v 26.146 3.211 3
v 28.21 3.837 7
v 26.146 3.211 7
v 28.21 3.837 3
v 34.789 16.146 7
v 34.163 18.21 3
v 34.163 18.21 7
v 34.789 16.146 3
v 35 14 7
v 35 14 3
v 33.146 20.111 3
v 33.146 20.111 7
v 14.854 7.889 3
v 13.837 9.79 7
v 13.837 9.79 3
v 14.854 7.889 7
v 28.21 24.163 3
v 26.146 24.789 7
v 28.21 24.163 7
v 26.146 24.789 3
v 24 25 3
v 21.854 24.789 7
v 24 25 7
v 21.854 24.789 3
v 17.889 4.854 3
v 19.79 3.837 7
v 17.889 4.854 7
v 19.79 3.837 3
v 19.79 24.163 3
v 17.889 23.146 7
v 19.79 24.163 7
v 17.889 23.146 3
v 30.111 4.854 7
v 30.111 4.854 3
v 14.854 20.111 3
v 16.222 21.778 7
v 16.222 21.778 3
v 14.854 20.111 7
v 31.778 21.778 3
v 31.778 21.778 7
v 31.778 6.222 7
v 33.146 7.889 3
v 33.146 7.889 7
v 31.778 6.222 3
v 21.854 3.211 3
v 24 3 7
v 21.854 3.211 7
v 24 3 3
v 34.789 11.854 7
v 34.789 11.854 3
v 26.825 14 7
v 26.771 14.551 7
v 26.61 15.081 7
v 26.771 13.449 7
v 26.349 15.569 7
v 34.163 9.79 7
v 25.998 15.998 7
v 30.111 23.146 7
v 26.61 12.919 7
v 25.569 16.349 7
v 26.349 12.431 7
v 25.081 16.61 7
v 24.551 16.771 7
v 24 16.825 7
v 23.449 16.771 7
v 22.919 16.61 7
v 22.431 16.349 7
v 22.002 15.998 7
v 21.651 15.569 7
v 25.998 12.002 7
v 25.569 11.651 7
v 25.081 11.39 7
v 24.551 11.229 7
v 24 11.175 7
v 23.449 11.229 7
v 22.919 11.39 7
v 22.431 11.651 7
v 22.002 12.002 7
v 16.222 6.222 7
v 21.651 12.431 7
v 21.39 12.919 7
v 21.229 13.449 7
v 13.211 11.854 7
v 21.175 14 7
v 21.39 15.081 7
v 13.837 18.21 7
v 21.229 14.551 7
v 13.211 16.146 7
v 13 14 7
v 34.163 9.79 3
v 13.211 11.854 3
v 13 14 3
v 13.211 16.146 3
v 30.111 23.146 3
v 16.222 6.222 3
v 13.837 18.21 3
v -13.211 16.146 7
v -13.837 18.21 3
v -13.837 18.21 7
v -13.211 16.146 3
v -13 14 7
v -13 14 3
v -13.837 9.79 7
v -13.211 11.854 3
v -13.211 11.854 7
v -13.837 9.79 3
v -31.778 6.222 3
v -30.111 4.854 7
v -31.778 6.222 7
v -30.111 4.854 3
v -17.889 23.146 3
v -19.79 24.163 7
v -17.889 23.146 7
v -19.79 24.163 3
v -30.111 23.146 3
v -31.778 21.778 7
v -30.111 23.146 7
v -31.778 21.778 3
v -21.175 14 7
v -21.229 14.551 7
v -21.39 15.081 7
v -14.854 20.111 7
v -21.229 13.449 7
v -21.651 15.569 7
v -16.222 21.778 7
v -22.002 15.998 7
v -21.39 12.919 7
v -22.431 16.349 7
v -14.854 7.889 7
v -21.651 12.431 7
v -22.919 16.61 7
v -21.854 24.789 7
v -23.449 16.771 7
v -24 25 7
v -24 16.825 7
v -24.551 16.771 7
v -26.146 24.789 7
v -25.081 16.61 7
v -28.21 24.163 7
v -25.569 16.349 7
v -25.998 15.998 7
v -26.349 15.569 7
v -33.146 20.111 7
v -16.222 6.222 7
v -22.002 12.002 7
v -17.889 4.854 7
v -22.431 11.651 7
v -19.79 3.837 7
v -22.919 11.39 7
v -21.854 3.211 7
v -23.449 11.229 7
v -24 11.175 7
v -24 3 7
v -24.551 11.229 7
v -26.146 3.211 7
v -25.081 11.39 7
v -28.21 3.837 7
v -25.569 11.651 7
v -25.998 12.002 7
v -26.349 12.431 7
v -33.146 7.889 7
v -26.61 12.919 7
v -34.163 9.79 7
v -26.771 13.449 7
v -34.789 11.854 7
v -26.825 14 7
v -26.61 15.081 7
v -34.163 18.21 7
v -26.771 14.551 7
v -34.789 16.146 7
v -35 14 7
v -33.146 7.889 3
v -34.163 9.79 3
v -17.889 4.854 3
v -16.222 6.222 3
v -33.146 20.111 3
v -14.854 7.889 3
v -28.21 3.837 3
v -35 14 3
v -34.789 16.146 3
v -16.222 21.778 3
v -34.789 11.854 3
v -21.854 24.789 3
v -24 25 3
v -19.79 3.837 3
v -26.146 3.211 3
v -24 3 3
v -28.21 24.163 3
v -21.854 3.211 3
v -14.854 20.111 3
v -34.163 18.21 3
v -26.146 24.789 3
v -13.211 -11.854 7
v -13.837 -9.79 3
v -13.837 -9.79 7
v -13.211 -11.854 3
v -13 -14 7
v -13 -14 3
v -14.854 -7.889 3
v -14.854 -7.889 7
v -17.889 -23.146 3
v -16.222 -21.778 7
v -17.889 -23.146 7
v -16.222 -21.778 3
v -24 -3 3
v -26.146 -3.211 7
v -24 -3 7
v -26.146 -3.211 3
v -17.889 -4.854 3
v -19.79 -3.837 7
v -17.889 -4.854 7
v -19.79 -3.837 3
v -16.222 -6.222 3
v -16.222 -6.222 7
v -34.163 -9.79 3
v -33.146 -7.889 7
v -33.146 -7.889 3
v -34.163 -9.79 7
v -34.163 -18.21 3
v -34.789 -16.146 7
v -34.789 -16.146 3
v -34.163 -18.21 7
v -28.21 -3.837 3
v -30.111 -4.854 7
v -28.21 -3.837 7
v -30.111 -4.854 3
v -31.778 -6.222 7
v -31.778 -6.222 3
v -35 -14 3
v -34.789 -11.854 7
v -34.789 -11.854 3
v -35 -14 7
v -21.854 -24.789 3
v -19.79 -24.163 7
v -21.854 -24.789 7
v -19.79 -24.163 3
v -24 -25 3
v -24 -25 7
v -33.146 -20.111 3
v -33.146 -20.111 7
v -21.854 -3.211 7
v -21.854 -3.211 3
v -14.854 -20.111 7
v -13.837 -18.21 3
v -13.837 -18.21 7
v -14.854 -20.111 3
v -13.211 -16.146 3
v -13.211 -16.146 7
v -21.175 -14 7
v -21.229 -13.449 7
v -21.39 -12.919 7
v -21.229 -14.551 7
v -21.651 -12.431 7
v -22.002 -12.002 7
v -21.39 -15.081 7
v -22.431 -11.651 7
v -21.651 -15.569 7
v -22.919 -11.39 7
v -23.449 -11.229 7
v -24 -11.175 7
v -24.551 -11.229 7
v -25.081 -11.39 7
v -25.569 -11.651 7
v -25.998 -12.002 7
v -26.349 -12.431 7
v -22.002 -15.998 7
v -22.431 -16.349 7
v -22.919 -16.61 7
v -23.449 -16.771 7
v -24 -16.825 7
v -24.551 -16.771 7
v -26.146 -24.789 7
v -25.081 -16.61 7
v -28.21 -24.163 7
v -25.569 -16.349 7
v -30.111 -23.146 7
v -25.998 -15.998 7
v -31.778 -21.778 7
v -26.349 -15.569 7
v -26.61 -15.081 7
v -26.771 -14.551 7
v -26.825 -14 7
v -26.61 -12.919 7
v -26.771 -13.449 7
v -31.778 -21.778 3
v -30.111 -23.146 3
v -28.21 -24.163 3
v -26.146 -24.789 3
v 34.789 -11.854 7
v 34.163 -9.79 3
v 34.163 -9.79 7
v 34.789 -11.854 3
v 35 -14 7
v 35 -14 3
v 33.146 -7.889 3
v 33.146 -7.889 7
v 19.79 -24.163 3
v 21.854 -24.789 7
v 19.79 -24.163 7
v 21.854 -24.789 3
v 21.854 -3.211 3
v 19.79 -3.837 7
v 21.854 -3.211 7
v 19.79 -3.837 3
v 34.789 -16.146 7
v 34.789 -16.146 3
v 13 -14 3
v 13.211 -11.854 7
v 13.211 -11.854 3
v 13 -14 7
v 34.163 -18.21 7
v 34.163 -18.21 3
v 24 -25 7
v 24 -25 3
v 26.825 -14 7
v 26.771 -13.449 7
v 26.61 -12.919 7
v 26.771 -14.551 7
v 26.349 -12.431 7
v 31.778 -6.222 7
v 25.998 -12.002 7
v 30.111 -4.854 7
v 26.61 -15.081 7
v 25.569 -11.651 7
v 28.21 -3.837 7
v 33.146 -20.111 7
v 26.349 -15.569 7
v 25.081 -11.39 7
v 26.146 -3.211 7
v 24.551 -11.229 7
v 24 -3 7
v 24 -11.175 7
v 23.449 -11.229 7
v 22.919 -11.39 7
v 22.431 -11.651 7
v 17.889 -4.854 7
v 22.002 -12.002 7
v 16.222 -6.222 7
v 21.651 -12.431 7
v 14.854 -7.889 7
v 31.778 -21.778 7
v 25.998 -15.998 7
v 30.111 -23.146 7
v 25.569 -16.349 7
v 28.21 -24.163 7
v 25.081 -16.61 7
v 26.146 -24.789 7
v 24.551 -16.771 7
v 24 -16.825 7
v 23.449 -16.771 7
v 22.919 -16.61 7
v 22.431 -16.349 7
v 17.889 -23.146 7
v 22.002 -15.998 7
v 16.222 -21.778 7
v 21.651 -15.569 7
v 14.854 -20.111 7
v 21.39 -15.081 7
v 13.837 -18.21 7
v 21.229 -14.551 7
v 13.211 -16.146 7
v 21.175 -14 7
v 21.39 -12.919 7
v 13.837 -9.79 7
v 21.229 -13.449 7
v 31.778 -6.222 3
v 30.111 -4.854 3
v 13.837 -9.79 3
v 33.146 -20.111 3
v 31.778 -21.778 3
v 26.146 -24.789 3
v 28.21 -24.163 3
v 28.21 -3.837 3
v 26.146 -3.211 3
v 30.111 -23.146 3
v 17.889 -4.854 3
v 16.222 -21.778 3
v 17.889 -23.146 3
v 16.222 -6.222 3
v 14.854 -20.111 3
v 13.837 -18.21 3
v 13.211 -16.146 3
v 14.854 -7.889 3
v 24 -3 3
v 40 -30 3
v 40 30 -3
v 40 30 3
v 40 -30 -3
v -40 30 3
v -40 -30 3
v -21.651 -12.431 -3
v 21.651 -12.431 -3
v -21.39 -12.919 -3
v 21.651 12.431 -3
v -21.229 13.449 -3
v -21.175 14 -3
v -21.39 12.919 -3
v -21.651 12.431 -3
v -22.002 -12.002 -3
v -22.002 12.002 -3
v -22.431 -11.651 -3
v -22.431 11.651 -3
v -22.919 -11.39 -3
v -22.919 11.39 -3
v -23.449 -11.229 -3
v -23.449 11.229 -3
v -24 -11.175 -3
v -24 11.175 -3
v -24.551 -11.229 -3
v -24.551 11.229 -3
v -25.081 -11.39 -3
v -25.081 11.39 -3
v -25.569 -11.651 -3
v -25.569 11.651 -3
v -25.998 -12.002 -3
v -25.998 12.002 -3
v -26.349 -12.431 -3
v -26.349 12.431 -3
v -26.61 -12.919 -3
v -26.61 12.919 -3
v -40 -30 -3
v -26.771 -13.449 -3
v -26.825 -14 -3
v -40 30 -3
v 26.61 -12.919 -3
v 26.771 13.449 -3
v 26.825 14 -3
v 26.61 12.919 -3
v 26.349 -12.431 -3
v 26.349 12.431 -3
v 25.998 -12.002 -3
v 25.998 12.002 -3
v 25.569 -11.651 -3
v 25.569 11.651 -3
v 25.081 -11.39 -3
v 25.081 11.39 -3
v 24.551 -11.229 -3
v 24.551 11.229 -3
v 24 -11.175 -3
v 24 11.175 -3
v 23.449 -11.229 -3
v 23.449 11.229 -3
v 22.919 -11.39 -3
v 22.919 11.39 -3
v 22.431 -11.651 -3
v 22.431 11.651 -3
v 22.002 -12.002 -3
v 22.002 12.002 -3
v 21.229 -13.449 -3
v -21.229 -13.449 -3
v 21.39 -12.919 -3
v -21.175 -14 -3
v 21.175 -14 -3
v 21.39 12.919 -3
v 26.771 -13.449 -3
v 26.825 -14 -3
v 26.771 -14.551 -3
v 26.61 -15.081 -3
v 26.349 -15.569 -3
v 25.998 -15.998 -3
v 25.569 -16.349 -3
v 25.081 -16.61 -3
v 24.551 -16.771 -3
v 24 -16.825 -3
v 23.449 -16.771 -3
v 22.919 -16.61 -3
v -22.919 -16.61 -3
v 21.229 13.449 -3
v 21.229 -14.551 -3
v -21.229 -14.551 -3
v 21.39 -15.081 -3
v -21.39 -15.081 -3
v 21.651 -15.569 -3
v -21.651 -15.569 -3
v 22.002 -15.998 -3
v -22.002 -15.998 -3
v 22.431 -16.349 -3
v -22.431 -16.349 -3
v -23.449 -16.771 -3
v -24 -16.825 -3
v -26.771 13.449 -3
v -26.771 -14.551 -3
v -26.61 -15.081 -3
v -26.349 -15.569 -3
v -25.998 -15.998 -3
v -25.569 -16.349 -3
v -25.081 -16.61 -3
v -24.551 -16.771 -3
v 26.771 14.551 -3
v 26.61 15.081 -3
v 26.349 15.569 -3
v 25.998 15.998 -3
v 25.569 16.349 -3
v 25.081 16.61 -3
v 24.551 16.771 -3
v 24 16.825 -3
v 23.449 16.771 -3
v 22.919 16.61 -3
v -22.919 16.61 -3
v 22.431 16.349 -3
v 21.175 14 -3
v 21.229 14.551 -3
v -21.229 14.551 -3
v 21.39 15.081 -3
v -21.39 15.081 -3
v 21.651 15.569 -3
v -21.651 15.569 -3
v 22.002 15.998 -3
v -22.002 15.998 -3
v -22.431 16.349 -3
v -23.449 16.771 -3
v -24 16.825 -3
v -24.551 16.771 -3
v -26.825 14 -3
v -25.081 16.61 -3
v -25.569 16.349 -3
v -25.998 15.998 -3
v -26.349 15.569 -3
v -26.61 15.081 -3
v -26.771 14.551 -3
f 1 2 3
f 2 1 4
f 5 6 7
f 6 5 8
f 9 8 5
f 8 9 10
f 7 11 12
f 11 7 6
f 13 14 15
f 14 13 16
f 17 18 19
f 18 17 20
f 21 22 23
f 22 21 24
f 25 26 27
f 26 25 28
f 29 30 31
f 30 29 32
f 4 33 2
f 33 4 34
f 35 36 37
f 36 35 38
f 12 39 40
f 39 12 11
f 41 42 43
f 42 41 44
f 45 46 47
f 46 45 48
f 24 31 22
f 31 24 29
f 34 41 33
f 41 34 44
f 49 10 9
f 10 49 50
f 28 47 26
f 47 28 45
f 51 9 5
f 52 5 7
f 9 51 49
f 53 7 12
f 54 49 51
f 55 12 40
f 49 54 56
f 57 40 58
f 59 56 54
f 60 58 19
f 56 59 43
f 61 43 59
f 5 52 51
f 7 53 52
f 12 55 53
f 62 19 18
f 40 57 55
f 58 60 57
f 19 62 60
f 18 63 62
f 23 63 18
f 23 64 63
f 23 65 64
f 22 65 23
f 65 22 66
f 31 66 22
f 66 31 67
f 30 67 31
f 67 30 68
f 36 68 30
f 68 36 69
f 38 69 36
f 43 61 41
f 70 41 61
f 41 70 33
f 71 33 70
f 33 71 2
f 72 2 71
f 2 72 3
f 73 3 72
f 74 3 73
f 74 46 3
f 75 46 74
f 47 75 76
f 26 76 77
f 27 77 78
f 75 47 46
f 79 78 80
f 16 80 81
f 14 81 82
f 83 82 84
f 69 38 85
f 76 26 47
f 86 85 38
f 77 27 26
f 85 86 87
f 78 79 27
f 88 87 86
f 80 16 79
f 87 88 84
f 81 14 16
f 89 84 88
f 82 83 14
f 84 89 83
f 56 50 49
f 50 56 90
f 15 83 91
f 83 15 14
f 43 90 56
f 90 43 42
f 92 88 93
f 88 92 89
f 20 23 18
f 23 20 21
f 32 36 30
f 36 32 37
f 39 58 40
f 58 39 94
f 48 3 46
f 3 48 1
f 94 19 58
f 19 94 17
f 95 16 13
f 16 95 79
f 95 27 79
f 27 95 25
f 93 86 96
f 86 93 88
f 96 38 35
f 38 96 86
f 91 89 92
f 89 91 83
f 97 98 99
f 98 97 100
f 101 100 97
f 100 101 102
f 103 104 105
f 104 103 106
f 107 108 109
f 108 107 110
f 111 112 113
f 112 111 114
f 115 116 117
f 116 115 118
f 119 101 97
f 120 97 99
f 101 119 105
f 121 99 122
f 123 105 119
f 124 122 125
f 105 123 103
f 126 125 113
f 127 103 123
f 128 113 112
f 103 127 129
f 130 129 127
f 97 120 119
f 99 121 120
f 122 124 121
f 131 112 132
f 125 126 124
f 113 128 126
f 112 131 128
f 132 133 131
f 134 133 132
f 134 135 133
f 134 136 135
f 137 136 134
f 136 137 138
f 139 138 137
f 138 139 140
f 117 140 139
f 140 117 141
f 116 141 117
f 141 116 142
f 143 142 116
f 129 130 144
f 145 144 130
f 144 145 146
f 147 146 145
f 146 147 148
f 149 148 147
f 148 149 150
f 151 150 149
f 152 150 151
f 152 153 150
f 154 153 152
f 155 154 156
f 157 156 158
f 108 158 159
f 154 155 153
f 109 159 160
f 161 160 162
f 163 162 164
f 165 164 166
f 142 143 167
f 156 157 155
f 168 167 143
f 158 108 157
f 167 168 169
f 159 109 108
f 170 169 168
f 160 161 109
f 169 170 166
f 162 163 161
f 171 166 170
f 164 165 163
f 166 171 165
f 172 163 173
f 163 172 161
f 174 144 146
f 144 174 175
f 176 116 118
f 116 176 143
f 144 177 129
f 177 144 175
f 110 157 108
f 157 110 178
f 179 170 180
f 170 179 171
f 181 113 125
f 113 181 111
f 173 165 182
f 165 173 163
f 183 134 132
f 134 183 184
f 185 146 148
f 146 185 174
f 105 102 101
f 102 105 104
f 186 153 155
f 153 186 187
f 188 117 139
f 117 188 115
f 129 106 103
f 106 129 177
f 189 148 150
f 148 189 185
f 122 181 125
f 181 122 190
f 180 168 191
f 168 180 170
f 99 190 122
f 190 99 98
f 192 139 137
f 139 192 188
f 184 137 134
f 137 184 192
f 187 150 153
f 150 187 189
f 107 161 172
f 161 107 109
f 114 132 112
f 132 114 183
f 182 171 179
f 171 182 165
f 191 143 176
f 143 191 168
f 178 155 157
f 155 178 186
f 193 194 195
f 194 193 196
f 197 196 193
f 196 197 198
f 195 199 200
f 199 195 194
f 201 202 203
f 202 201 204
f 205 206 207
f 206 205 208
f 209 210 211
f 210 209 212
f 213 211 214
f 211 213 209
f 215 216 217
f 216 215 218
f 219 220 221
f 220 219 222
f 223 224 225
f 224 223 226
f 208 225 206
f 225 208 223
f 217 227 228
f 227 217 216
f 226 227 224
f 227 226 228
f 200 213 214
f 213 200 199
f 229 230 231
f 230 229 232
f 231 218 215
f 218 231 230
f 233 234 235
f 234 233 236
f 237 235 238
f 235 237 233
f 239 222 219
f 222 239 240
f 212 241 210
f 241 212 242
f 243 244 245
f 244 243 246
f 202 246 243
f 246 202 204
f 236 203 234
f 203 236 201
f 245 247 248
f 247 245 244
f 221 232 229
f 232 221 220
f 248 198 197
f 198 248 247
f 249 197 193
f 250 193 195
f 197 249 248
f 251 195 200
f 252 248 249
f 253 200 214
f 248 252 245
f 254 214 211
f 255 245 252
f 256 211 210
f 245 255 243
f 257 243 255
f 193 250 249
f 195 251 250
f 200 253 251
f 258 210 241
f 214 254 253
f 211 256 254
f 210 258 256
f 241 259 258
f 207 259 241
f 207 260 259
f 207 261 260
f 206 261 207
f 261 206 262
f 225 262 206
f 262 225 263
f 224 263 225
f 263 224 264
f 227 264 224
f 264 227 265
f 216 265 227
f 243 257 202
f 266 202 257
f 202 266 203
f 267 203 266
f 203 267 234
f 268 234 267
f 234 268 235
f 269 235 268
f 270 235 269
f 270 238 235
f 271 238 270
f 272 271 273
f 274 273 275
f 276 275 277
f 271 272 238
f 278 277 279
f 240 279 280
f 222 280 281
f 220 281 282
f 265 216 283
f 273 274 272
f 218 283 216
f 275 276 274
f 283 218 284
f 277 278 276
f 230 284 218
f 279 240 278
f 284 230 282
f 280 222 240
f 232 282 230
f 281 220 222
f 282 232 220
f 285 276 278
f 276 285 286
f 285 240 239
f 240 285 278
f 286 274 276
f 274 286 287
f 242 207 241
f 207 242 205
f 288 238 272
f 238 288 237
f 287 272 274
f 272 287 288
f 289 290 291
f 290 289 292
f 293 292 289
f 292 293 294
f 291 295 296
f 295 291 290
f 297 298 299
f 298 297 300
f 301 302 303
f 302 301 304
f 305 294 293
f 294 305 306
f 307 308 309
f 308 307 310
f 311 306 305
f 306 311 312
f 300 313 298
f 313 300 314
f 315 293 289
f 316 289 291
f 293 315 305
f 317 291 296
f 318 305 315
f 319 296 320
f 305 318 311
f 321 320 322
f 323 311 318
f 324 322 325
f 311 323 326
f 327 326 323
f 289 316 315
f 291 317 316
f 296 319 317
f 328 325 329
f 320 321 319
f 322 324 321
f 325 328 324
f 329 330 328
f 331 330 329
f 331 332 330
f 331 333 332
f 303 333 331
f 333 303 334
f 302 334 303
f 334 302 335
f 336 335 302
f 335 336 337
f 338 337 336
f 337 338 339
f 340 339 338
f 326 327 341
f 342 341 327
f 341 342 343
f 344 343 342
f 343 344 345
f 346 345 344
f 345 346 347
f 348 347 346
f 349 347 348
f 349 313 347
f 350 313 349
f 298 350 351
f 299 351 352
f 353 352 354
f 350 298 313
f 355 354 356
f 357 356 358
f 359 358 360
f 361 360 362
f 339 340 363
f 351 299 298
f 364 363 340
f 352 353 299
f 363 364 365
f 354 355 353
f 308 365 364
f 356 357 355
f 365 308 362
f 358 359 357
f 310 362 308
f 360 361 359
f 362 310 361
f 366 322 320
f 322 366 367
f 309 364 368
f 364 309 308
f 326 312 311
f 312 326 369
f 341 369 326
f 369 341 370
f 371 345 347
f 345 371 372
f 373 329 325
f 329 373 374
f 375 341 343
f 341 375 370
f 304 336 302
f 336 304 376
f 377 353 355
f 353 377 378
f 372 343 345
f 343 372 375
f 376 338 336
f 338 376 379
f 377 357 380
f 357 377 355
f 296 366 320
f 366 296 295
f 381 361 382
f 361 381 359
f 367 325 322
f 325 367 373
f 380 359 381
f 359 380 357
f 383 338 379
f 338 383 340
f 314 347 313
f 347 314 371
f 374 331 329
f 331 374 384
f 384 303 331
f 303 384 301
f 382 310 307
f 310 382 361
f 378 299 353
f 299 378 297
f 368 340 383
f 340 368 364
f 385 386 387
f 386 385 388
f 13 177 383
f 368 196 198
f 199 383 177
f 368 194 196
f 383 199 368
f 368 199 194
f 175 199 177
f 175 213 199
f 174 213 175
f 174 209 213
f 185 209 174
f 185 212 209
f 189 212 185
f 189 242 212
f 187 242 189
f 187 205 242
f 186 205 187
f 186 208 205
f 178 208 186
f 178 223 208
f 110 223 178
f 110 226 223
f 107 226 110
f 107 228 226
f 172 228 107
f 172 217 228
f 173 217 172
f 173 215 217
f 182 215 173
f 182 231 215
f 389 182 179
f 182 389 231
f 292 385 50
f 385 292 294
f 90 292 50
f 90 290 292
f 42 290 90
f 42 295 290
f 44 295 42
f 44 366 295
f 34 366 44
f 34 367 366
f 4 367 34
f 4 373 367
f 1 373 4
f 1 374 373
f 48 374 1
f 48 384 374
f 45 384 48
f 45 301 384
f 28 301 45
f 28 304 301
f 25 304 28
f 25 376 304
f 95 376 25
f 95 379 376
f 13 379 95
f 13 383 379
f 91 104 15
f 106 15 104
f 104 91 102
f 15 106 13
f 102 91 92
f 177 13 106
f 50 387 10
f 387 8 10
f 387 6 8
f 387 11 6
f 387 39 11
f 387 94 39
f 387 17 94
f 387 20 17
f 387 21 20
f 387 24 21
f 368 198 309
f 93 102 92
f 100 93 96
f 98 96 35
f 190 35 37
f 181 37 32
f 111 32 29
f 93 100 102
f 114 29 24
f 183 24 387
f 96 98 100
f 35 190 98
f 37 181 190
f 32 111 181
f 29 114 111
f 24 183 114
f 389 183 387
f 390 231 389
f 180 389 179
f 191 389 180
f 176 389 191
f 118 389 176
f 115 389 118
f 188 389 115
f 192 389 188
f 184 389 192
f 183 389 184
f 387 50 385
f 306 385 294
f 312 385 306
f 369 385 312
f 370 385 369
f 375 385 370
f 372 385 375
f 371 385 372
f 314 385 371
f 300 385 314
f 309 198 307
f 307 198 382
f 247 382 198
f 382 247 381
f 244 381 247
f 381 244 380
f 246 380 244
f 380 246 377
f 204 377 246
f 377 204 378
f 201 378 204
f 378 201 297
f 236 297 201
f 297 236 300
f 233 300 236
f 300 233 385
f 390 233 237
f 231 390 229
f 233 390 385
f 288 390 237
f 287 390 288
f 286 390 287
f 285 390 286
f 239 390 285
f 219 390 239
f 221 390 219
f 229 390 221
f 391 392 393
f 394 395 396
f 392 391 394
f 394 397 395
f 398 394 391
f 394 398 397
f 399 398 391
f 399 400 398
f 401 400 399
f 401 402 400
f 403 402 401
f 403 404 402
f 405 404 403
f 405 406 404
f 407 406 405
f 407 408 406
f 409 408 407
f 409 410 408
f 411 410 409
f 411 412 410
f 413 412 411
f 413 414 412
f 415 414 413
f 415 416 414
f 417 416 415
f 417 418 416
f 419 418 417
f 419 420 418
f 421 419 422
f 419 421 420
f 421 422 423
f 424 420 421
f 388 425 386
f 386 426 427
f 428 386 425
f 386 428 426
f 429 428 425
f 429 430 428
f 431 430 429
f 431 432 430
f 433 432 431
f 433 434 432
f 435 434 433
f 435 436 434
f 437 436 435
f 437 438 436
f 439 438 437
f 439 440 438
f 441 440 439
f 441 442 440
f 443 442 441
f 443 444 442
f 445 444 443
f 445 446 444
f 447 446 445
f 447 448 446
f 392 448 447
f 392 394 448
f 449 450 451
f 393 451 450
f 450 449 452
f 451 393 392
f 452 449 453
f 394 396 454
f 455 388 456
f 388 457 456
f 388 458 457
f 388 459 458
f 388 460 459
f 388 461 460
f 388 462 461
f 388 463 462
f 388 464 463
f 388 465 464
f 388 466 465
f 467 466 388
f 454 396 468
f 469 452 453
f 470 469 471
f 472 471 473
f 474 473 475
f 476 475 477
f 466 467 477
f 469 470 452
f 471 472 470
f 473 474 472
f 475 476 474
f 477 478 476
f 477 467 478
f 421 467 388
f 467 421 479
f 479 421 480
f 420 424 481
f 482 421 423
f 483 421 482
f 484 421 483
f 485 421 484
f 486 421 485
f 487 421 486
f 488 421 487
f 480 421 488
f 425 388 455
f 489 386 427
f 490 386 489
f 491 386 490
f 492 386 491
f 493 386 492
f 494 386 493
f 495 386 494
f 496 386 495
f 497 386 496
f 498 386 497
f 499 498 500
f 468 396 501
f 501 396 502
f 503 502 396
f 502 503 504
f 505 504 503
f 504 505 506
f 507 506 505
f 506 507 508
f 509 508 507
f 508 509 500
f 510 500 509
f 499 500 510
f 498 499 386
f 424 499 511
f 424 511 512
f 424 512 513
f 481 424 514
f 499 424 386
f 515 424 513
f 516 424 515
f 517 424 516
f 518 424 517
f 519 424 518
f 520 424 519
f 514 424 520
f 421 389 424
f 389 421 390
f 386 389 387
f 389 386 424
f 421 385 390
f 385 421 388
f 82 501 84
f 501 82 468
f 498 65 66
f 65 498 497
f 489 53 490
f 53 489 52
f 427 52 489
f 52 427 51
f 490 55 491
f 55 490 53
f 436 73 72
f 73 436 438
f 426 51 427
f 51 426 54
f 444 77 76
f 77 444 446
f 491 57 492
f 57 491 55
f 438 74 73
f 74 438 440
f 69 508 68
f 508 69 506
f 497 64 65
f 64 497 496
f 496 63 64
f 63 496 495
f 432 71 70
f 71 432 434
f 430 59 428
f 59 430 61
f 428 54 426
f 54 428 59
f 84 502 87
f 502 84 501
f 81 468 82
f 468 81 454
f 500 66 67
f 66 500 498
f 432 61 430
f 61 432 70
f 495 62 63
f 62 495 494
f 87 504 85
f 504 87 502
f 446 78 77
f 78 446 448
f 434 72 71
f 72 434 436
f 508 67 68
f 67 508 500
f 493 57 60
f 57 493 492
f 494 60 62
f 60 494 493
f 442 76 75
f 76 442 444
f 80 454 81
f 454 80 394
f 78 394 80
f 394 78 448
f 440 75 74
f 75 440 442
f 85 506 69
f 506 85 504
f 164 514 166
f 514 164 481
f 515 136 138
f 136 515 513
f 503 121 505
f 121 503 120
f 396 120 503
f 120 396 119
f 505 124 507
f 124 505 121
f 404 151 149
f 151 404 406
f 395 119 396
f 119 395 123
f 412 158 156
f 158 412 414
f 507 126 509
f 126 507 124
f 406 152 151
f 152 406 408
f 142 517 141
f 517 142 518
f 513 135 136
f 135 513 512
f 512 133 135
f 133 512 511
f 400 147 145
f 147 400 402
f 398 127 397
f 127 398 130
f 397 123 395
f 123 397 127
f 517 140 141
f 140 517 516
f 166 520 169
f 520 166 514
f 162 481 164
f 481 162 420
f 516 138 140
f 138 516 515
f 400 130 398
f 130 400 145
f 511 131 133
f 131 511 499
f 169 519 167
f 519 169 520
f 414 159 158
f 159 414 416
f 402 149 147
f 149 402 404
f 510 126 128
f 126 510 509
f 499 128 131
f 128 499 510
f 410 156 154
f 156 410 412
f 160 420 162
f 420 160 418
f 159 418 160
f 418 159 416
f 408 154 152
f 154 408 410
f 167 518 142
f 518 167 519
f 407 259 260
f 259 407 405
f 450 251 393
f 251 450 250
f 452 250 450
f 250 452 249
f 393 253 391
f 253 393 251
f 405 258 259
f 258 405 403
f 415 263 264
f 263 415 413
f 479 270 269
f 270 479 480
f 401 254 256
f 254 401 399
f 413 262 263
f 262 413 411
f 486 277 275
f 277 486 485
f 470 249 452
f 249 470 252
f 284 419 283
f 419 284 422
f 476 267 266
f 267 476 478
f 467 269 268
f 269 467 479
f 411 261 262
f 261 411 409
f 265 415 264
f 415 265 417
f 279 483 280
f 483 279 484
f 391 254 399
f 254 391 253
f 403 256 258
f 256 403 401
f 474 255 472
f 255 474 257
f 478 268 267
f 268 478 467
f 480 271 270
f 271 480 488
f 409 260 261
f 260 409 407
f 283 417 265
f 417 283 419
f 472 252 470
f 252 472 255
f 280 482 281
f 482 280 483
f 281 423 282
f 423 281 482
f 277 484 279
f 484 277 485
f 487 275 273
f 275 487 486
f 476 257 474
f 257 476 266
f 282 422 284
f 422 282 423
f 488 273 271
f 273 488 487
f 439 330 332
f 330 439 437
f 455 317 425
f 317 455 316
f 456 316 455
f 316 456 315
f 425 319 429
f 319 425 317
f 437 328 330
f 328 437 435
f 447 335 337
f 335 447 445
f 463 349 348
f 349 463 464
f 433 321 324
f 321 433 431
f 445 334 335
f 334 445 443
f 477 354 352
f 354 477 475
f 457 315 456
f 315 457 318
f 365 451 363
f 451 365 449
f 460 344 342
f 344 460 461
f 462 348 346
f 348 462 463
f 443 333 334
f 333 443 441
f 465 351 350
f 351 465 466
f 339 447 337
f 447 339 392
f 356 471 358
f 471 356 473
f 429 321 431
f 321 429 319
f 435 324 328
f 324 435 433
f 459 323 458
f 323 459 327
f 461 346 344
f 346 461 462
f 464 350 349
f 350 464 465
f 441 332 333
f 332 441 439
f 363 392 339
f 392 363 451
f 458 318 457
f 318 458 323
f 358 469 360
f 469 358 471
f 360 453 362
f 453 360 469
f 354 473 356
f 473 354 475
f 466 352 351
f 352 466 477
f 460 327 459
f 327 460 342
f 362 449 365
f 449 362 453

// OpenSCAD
$fn = 32;

// ----------------------------------------------------------------------
// Anchor pads 80 x 60 x 10
// four corner bosses with anchor holes
// ----------------------------------------------------------------------

// --- parameters (mm) ---
plate = [80, 60, 6];     // base plate size (x, y, z)
pads = 4;                // boss count, one per corner
edge = 16;               // boss centre offset from the plate edge
boss_d = 22;             // boss diameter
boss_h = 4;              // boss height above the base plate
bore_d = 5.5;            // nominal hole diameter from the drawing
print_allowance = 0.15;  // clearance added for printing

// --- derived feature positions (mm) ---
hole_d = bore_d + print_allowance;  // = 5.65   hole diameter as printed
height = plate[2] + boss_h;         // = 10   overall height of the part
corner_x = plate[0] / 2 - edge;     // = 24   boss centre X
corner_y = plate[1] / 2 - edge;     // = 14   boss centre Y
feature_centers = [
  [corner_x, corner_y],
  [-corner_x, corner_y],
  [-corner_x, -corner_y],
  [corner_x, -corner_y]
];   // boss centres, anchor holes are drilled there

// base plate, four bosses standing on it, anchor holes all the way through
difference() {
  union() {
    cube(plate, center = true);
    for (centre = feature_centers)
      translate([centre[0], centre[1], plate[2] / 2 - 1])
        cylinder(d = boss_d, h = boss_h + 1);
  }
  for (centre = feature_centers)
    translate([centre[0], centre[1], -height])
      cylinder(d = hole_d, h = 2 * height + 2);  // through boss and plate
}
